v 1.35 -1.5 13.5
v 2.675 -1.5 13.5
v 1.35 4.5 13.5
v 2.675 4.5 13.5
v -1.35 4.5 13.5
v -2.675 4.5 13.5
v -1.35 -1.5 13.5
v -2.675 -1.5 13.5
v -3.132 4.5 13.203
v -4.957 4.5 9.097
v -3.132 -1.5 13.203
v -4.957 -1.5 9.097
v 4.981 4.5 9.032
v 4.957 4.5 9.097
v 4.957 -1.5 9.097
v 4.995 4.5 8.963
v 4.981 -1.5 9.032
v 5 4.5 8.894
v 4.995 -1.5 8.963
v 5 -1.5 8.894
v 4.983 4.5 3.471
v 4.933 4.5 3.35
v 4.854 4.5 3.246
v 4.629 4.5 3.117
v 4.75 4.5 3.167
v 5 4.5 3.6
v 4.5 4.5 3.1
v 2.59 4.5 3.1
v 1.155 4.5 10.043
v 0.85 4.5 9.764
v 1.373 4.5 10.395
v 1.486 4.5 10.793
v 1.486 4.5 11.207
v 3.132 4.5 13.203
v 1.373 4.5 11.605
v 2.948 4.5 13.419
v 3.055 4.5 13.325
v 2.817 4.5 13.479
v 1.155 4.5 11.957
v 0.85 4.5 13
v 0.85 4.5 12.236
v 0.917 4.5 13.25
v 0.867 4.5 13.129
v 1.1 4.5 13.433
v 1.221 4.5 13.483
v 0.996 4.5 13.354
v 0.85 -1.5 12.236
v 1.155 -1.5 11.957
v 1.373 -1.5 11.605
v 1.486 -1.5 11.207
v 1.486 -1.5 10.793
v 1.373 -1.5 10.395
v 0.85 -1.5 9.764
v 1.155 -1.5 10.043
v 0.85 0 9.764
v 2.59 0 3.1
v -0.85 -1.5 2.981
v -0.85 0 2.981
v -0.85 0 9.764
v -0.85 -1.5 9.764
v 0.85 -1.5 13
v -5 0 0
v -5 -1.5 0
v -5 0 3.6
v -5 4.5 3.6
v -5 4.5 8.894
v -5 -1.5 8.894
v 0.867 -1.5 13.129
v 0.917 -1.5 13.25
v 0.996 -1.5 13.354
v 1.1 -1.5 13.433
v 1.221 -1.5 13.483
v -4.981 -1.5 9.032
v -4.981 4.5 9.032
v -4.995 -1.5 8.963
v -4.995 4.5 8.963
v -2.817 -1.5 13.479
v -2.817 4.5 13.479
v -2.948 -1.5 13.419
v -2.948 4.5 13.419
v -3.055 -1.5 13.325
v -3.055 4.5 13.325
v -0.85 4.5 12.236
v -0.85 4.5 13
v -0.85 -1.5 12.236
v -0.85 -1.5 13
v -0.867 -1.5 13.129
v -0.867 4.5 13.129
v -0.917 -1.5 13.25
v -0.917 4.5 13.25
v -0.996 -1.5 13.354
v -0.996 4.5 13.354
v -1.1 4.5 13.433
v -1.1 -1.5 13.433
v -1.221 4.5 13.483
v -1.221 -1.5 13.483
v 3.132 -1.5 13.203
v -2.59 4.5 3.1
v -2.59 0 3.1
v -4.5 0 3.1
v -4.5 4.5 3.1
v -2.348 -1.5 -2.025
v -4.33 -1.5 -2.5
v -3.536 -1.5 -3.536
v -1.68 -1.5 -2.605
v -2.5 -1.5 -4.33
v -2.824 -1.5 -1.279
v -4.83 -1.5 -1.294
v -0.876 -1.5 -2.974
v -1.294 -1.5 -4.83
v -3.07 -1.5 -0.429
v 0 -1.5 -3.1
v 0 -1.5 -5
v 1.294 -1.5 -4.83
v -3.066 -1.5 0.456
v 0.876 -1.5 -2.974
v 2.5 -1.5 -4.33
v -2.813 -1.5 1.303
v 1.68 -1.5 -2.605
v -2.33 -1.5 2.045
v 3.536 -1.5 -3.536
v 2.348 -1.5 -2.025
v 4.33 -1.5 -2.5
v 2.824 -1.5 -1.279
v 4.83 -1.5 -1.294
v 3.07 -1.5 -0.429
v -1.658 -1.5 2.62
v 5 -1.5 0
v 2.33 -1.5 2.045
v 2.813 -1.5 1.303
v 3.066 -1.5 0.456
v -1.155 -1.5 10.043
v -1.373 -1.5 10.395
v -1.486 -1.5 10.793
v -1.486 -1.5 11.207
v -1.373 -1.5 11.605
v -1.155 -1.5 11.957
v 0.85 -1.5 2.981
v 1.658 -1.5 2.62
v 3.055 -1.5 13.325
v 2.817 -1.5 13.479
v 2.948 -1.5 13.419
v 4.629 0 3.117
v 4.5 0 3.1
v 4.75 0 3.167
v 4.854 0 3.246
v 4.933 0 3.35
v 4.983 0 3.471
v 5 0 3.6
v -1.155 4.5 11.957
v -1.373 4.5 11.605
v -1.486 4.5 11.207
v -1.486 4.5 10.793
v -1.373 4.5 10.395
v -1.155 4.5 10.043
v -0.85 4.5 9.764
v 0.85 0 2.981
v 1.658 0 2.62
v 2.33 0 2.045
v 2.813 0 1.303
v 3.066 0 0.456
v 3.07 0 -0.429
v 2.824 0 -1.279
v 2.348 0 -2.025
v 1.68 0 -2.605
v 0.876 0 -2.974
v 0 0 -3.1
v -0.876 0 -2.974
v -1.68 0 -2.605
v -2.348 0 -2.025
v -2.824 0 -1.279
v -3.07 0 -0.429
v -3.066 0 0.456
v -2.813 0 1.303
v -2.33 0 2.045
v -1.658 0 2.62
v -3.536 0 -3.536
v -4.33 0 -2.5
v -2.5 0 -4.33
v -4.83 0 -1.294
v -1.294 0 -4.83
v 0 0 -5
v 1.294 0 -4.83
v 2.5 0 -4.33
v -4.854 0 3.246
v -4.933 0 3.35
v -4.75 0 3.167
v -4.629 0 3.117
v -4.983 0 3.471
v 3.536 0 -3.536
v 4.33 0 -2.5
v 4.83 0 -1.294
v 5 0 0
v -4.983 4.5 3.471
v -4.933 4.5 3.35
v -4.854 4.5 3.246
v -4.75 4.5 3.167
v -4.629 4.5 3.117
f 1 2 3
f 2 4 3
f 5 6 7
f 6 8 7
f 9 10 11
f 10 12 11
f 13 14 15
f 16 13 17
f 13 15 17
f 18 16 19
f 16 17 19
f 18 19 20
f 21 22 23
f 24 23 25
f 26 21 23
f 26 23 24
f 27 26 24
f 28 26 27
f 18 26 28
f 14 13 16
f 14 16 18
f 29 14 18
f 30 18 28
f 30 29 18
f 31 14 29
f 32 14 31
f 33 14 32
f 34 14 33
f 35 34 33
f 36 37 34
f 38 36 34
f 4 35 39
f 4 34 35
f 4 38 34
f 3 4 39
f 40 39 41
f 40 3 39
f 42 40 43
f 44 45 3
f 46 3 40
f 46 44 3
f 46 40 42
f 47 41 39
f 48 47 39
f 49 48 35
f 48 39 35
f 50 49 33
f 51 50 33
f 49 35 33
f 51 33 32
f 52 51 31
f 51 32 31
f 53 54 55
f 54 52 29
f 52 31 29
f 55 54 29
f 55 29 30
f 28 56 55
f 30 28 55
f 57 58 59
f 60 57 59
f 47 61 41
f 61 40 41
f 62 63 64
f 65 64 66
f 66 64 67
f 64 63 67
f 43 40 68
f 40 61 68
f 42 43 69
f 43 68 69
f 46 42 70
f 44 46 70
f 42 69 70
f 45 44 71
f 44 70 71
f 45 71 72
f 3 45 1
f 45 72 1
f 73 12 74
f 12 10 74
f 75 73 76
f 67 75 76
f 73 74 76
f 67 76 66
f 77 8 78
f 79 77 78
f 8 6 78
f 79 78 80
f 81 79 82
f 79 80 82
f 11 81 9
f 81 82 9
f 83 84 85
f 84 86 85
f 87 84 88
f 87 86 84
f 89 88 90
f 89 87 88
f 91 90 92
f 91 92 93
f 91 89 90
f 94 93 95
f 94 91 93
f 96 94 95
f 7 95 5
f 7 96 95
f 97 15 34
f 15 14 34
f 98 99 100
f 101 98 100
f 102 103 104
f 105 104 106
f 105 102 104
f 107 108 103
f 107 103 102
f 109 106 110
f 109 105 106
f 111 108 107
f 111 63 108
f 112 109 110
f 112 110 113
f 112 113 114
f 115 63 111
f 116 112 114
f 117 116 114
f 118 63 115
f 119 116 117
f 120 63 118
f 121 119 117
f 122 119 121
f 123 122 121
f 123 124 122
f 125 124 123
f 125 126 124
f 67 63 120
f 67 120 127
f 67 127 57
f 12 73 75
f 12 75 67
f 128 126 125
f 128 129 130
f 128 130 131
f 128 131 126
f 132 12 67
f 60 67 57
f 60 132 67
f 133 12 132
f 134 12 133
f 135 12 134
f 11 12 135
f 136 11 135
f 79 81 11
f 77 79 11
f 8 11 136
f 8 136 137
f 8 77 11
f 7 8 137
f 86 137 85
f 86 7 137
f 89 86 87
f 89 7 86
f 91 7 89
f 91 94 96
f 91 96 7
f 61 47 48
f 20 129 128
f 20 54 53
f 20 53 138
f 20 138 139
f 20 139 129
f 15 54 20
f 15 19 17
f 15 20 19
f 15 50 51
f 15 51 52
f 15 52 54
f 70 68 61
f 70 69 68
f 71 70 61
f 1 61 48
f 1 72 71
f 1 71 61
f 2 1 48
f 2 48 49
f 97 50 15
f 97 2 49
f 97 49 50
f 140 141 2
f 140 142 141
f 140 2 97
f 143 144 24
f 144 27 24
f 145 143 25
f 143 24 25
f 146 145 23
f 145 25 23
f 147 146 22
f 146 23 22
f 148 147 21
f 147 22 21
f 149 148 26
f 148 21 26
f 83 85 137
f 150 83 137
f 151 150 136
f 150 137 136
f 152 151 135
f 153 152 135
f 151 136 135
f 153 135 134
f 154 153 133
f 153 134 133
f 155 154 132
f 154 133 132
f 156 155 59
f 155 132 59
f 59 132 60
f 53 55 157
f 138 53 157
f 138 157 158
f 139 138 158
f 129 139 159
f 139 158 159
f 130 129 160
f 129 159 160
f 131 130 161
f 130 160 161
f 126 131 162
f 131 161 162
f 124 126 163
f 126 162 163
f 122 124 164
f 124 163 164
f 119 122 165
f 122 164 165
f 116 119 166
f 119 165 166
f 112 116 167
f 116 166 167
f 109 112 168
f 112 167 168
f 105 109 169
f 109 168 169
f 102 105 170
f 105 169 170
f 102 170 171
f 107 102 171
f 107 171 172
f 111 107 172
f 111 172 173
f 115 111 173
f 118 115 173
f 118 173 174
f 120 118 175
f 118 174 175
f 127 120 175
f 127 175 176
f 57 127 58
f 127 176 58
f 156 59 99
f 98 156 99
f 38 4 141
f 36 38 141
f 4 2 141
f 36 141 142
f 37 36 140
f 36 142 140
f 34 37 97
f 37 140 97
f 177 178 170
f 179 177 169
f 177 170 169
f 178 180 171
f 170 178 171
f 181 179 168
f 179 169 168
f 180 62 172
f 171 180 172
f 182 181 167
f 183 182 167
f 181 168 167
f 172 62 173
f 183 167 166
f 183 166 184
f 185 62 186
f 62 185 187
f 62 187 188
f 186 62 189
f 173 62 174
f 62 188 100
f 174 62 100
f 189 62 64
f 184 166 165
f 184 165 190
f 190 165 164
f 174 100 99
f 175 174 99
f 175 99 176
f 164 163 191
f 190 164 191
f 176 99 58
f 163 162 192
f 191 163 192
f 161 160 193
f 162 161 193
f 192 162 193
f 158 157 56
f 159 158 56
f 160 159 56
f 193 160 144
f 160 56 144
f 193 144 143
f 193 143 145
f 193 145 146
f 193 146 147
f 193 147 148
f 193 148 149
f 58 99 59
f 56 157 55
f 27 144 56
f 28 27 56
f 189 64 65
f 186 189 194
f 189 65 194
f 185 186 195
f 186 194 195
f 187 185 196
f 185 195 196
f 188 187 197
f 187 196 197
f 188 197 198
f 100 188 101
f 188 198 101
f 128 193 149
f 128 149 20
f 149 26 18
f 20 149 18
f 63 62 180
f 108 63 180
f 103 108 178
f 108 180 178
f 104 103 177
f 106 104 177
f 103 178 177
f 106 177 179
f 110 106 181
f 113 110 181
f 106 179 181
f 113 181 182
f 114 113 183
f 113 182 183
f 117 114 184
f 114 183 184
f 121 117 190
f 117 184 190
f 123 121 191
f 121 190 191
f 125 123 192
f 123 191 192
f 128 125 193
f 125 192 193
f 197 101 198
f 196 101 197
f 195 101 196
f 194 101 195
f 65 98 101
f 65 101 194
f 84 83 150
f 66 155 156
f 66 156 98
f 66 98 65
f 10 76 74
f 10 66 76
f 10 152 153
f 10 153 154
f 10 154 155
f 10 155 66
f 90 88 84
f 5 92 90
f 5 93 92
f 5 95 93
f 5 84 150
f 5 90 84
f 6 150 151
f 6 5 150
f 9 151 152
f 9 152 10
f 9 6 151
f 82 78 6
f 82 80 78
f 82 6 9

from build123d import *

# Parameters (mm, degrees)
F1_DEPTH = 1.5
F3_DEPTH = 4.5
F4_R     = 0.5


with BuildPart() as f1:
    # F0 (on Front) → F1 (new body)
    with BuildSketch(Plane.XZ):
        with BuildLine():
            ThreePointArc((0.85, 2.9811910372), (0, -3.1), (-0.85, 2.9811910372))
            Line((-0.85, 2.9811910372), (-0.85, 9.7640792906))
            ThreePointArc((-0.85, 9.7640792906), (-1.5, 11), (-0.85, 12.2359207094))
            Line((-0.85, 12.2359207094), (-0.85, 13.5))
            Line((-0.85, 13.5), (-3, 13.5))
            Line((-3, 13.5), (-5, 9))
            Line((-5, 9), (-5, 0))
            ThreePointArc((-5, 0), (0, -5), (5, 0))
            Line((5, 0), (5, 9))
            Line((5, 9), (3, 13.5))
            Line((3, 13.5), (0.85, 13.5))
            Line((0.85, 13.5), (0.85, 12.2359207094))
            ThreePointArc((0.85, 12.2359207094), (1.5, 11), (0.85, 9.7640792906))
            Line((0.85, 9.7640792906), (0.85, 2.9811910372))
        make_face()
    extrude(amount=F1_DEPTH)

    # F2 (on face) → F3 (join)
    with BuildSketch(Plane(origin=(0, 0, 0), x_dir=(-1, 0, 0), z_dir=(0, 1, 0))):
        with BuildLine():
            Line((0.85, 9.7640792906), (2.590399856, 3.1))
            Line((2.590399856, 3.1), (5, 3.1))
            Line((5, 3.1), (5, 9))
            Line((5, 9), (3, 13.5))
            Line((3, 13.5), (0.85, 13.5))
            Line((0.85, 13.5), (0.85, 12.2359207094))
            ThreePointArc((0.85, 12.2359207094), (1.5, 11), (0.85, 9.7640792906))
        make_face()
        with BuildLine():
            Line((-5, 3.1), (-2.590399856, 3.1))
            Line((-2.590399856, 3.1), (-0.85, 9.7640792906))
            ThreePointArc((-0.85, 9.7640792906), (-1.5, 11), (-0.85, 12.2359207094))
            Line((-0.85, 12.2359207094), (-0.85, 13.5))
            Line((-0.85, 13.5), (-3, 13.5))
            Line((-3, 13.5), (-5, 9))
            Line((-5, 9), (-5, 3.1))
        make_face()
    extrude(amount=F3_DEPTH)

    # F4
    f4_edges = [f1.edges().sort_by_distance(p)[0] for p in [
        (3, 1.5, 13.5),
        (5, 1.5, 9),
        (-3, 1.5, 13.5),
        (-5, 1.5, 9),
        (0.85, 1.5, 13.5),
        (-0.85, 1.5, 13.5),
        (5, 2.25, 3.1),
        (-5, 2.25, 3.1),
    ]]
    fillet(f4_edges, radius=F4_R)


solid = f1.part
